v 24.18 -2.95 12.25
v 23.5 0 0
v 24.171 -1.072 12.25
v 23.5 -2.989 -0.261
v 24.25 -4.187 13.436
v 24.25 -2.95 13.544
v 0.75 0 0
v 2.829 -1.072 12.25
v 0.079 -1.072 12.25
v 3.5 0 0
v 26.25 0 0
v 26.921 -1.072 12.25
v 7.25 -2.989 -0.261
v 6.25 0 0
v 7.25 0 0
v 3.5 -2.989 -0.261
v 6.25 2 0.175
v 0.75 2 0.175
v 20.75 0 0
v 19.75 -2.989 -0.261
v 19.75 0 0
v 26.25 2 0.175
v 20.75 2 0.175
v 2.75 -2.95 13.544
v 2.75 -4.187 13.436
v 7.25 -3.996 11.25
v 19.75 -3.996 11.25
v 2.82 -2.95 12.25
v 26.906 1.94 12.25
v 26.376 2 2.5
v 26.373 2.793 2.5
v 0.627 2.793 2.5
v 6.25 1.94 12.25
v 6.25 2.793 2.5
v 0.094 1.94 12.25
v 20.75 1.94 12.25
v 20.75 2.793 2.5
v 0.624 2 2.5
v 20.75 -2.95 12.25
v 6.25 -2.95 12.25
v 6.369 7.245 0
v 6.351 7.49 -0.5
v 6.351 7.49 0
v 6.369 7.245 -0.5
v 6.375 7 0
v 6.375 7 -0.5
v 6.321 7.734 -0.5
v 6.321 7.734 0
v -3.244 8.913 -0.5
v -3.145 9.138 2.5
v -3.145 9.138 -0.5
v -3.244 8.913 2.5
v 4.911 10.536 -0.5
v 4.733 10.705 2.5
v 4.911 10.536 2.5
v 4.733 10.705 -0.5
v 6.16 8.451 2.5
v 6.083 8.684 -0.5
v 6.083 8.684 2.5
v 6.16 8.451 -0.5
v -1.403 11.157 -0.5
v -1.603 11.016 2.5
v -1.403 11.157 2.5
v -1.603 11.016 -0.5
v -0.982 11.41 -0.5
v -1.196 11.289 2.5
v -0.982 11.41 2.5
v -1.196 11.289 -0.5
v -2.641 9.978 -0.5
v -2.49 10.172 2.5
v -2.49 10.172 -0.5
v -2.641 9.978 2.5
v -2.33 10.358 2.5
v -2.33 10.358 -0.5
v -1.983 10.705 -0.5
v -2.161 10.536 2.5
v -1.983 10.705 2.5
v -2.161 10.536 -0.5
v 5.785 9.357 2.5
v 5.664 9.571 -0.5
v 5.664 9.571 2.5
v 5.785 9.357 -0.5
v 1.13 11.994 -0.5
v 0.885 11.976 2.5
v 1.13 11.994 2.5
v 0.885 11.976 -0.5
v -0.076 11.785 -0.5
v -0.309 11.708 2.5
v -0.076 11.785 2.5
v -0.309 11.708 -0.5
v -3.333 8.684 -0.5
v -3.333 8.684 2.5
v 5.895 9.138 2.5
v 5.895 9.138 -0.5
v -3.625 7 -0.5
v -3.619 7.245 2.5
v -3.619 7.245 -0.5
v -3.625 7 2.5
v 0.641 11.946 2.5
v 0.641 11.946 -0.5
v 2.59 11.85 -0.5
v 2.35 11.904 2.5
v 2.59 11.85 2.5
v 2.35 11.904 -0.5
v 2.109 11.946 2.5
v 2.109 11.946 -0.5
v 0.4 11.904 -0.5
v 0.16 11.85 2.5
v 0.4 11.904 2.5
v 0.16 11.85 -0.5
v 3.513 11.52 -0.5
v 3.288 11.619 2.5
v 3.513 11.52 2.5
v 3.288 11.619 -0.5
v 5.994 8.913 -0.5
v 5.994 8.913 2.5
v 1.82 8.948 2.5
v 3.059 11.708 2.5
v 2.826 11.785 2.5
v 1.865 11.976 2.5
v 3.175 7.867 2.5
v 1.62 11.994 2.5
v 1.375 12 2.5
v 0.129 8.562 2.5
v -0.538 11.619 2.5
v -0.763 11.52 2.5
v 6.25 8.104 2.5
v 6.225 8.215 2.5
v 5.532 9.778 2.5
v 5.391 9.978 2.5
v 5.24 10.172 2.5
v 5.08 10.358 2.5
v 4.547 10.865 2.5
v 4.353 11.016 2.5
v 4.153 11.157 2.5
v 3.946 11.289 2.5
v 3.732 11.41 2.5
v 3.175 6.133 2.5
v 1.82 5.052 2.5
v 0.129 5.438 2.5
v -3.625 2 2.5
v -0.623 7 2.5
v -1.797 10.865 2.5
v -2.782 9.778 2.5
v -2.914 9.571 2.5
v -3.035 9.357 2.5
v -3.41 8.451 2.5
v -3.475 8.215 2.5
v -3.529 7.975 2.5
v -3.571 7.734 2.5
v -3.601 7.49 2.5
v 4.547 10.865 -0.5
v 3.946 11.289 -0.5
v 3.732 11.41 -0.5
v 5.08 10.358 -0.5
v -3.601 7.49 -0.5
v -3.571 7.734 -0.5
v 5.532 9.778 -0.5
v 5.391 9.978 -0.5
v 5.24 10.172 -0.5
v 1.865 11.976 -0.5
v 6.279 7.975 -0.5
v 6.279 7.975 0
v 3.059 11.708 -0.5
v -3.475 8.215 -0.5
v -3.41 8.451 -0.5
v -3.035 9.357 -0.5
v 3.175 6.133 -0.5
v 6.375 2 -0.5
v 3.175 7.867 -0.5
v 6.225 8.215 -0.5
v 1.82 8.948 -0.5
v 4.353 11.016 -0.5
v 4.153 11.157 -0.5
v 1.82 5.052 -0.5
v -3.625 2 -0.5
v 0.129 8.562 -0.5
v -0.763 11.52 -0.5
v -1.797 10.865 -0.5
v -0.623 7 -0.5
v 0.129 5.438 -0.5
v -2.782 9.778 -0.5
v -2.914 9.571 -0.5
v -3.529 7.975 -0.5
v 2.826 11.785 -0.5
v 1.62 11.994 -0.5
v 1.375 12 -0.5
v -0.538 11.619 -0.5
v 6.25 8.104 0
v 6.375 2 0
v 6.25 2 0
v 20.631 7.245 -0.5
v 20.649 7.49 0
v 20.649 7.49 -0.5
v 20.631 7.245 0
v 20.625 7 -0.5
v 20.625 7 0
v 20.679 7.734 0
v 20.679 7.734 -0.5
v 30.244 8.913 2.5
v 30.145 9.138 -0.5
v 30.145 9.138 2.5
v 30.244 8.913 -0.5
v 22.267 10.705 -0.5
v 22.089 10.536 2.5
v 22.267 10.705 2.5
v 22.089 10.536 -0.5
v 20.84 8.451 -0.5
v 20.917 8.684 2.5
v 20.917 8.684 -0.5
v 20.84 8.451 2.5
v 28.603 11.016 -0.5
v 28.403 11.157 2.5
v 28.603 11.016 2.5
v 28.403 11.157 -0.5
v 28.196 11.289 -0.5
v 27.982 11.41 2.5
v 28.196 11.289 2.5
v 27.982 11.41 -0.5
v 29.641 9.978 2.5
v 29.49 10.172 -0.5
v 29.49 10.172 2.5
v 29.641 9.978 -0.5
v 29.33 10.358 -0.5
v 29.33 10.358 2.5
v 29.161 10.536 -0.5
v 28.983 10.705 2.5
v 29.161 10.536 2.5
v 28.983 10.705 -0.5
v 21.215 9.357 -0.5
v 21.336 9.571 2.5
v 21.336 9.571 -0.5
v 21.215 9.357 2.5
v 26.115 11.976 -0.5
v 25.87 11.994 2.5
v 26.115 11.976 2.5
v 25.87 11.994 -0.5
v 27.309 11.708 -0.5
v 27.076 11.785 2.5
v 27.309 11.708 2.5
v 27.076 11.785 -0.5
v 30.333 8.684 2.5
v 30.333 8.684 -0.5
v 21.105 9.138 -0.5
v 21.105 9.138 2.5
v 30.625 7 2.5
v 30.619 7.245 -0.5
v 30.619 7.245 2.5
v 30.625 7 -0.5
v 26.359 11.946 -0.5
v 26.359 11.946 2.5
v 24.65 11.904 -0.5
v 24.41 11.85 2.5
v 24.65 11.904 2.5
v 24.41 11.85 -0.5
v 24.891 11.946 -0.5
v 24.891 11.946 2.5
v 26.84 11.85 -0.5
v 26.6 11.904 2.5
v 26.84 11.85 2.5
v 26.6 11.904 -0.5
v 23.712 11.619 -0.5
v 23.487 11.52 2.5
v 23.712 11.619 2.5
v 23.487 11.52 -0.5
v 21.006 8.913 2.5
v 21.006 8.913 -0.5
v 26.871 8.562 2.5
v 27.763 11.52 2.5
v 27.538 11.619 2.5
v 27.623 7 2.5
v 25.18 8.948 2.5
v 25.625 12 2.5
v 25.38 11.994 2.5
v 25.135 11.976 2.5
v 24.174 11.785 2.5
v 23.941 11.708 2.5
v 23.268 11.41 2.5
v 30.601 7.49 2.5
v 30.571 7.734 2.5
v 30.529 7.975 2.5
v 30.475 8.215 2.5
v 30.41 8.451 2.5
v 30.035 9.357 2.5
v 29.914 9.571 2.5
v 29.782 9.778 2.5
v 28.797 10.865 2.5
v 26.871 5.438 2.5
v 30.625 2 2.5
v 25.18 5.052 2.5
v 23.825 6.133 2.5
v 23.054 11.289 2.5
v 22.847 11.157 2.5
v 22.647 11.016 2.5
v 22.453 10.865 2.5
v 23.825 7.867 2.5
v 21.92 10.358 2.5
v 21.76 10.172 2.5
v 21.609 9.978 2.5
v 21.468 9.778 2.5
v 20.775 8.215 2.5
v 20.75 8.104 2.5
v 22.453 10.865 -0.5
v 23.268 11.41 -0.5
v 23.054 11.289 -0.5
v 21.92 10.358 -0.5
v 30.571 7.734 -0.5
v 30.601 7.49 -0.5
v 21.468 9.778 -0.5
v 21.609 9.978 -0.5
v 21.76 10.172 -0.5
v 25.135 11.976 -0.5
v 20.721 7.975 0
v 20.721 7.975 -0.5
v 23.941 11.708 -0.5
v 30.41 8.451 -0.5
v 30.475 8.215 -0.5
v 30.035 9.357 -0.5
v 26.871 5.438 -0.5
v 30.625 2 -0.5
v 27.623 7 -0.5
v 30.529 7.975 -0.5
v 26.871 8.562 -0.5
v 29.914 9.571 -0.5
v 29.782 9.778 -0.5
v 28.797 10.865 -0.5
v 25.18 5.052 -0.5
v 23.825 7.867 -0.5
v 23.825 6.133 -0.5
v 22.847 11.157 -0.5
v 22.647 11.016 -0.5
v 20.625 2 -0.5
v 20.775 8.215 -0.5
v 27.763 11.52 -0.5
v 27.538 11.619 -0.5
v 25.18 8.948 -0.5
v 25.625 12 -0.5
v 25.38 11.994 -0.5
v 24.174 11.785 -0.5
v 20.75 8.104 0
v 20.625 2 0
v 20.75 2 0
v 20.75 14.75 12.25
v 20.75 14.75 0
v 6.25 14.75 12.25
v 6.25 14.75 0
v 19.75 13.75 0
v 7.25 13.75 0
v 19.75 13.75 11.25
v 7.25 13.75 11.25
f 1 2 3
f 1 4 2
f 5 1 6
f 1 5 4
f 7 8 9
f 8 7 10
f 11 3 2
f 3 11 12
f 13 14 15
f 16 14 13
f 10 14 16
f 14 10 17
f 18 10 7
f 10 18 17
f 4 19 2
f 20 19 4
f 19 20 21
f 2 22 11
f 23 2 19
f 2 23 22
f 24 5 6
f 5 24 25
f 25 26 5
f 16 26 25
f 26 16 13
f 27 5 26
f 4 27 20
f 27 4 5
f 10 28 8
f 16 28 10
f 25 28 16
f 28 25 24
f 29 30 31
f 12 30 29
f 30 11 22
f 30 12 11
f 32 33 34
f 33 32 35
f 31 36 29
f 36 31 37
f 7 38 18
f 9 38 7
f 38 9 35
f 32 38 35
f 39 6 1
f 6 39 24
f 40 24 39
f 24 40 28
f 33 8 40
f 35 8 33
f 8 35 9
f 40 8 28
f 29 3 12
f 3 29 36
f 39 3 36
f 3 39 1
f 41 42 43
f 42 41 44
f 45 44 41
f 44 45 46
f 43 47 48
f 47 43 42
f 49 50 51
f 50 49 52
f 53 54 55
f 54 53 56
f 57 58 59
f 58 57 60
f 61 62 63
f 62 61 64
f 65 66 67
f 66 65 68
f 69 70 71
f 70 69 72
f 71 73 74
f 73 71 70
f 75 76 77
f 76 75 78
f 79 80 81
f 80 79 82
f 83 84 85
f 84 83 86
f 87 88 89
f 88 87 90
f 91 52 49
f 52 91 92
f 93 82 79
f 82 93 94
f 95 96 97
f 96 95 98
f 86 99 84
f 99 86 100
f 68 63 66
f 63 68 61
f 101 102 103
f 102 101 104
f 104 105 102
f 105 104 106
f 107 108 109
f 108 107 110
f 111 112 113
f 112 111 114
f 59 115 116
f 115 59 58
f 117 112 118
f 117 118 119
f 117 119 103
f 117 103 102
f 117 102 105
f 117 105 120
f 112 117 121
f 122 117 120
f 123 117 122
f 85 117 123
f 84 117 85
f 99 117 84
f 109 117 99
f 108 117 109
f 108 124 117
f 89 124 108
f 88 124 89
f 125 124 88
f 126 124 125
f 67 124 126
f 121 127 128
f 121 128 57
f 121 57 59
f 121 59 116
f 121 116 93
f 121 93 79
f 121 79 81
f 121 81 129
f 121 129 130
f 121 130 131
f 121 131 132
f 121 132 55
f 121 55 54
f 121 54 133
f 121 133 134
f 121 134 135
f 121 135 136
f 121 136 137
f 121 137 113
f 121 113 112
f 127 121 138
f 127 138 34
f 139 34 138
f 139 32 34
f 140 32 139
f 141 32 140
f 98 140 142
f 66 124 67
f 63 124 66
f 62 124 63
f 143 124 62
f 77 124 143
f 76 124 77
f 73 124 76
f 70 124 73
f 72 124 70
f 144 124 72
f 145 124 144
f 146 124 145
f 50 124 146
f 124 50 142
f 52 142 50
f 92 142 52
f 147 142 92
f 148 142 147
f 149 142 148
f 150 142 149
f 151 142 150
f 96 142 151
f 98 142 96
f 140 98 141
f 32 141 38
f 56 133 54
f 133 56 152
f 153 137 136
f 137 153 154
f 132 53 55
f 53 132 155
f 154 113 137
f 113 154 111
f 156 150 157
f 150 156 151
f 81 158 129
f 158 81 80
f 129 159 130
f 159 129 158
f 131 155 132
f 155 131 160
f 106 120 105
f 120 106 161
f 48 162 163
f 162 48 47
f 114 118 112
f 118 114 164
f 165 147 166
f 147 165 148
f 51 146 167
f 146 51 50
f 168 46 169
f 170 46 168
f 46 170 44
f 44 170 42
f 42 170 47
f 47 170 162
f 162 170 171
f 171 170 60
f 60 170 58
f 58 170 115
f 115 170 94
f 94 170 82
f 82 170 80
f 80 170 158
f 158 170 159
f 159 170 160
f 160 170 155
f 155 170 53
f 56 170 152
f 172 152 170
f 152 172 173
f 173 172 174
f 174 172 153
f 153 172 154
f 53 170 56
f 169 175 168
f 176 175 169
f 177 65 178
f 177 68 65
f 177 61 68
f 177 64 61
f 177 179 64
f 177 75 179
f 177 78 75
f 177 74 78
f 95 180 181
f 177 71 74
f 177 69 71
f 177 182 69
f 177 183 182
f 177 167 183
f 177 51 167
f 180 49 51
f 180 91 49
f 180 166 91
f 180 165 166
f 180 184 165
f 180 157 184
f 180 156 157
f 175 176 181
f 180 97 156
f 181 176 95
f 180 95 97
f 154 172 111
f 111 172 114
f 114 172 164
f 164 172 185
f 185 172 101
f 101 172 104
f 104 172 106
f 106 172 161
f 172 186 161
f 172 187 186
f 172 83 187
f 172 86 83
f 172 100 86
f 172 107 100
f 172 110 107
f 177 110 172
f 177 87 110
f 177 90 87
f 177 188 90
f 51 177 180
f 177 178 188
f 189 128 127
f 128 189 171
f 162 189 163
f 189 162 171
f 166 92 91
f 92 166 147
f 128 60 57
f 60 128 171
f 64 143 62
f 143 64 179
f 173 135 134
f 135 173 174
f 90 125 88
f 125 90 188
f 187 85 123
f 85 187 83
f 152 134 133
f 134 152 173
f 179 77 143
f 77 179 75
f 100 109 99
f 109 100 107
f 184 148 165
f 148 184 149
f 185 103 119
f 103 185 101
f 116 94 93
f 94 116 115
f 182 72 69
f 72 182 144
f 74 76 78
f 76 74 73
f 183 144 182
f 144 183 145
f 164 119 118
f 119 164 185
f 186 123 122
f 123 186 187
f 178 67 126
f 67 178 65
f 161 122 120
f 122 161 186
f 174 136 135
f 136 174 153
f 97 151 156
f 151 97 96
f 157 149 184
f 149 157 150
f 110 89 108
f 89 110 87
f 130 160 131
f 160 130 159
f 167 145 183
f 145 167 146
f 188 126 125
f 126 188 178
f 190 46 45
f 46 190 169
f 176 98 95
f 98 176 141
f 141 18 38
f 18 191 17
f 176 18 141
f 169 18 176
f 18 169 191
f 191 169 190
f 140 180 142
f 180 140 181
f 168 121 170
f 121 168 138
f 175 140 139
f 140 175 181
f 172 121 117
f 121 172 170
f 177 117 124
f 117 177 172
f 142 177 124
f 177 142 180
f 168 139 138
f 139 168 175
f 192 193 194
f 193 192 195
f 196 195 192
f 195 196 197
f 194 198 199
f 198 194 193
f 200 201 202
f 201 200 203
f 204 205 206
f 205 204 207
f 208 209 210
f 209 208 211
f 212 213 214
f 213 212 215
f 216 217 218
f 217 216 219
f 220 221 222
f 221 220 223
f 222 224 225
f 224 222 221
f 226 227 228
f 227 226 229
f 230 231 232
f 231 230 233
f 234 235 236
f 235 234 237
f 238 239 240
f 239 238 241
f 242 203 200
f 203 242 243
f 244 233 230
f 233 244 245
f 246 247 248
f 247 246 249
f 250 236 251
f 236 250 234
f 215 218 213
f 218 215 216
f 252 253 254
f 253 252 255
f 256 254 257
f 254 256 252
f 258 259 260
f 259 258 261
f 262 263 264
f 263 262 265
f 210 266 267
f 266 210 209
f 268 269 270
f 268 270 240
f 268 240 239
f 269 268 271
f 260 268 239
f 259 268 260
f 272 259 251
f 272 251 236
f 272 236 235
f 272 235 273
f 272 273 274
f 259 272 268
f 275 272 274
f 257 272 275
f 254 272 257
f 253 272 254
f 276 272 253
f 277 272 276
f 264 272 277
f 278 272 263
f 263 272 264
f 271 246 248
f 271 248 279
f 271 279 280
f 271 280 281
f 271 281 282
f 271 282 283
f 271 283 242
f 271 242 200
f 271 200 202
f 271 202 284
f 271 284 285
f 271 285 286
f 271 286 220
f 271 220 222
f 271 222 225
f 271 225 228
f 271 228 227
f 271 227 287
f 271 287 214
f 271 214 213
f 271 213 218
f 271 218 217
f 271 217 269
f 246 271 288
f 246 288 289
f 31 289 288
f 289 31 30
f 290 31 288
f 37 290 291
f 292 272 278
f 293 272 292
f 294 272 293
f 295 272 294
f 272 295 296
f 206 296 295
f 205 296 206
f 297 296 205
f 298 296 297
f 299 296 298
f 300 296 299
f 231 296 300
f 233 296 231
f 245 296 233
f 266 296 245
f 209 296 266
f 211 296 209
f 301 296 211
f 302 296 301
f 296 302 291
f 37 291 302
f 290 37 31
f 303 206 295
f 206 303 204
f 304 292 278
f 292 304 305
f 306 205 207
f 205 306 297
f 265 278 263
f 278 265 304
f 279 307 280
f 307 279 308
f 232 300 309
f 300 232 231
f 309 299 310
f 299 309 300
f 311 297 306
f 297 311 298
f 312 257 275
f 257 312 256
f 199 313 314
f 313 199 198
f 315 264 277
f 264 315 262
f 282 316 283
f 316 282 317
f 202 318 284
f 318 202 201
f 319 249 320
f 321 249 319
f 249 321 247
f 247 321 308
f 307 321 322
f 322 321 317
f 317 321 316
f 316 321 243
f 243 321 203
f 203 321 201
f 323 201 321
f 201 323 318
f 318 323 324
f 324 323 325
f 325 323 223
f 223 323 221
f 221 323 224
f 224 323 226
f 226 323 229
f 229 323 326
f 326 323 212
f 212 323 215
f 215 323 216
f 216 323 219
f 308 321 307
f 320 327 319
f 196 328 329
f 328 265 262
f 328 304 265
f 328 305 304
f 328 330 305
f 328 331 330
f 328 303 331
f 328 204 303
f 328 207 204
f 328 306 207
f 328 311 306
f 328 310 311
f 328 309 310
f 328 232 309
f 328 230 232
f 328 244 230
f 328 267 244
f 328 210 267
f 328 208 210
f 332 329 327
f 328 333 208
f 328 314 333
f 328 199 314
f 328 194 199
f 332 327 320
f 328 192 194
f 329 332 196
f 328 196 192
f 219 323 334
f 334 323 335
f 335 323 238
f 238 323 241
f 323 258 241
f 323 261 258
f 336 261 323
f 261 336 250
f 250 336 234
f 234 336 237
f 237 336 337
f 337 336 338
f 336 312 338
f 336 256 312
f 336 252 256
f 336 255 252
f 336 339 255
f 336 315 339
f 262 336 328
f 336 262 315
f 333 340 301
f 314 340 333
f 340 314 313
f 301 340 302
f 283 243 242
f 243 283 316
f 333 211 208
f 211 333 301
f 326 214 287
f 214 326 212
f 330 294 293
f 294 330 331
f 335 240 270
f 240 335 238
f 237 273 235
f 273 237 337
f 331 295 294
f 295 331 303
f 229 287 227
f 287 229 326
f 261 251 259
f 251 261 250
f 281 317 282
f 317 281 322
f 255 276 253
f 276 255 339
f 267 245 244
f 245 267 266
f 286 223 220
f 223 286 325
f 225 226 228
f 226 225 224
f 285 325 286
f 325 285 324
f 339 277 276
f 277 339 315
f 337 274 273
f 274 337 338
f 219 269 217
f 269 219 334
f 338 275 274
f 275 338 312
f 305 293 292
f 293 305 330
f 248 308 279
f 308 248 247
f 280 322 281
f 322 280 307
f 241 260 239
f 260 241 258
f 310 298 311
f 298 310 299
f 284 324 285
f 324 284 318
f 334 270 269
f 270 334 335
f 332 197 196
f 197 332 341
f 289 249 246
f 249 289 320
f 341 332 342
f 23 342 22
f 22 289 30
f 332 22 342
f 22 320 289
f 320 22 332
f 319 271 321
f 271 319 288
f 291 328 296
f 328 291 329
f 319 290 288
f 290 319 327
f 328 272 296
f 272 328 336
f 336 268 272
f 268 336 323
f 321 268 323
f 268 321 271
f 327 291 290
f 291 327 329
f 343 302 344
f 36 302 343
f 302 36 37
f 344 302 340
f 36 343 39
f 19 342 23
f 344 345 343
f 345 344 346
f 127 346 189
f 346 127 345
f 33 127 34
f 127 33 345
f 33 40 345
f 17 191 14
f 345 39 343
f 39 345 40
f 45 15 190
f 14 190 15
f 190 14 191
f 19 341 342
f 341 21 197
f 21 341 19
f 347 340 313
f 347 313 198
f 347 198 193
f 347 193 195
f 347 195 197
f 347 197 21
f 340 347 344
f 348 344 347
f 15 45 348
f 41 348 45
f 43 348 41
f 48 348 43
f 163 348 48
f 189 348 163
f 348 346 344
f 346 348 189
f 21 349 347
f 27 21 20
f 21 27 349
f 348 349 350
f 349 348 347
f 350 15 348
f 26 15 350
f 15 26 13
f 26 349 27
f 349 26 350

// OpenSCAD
// file: retainer-clip-template.scad
COVER_X = 27;
COVER_X_VARIANCE = 1.5;
COVER_X_OFFSET = 2.75;
COVER_Y = 6;
COVER_Y_OFFSET = .05;
COVER_Z = 13.75;
COVER_Z_OFFSET = 1.5;
COVER_ANGLE = 5;

CLIP_R_OUTER = 5;
CLIP_R_INNER = 1.8;
CLIP_X_SEPARATION = 24.25;
CLIP_Y_OFFSET = 7;
CLIP_Z = 3;
CLIP_Z_OFFSET = .5;

CYLINDER_FACETS = 128;

module copy_mirror(v) { 
    children(); 
    mirror(v) children(); 
} 

module retainerClip() {
    rotate([COVER_ANGLE, 0, 0]) {
        difference() {
            union() {
                translate([COVER_X_OFFSET, 0, 0])
                    linear_extrude(height = COVER_Y / 2) 
                        polygon(points=[[COVER_X_VARIANCE / 2, 0], [COVER_X - (COVER_X_OFFSET * 2) - (COVER_X_VARIANCE / 2), 0], [COVER_X - (COVER_X_OFFSET * 2), COVER_Z], [0, COVER_Z]]);
                translate([0, 0, -COVER_Y / 2])
                    linear_extrude(height = COVER_Y / 2) 
                        polygon(points=[[COVER_X_VARIANCE / 2, 0], [COVER_X - (COVER_X_VARIANCE / 2), 0], [COVER_X, COVER_Z], [0, COVER_Z]]);
            }
            rotate([-COVER_ANGLE, 0, 0]) {
                translate([0, COVER_Z - COVER_Z_OFFSET, -COVER_Y / 2])
                    cube([COVER_X, COVER_Z_OFFSET * 2, COVER_Y - COVER_Y_OFFSET]);
            }
        }
    
        rotate([-90 - COVER_ANGLE, 0, 0]) {
        translate([COVER_X / 2, 0, 0])
            copy_mirror(vec=[0,1,0])
                translate([-CLIP_X_SEPARATION / 2, CLIP_Y_OFFSET, -CLIP_Z_OFFSET])
                    difference() {
                        union() {
                            cylinder(r=CLIP_R_OUTER, h=CLIP_Z, $fn=CYLINDER_FACETS);
                            translate([-CLIP_R_OUTER, -CLIP_R_OUTER, 0])
                                cube([CLIP_R_OUTER * 2, CLIP_R_OUTER, CLIP_Z]);
                        }
                        polyhole(h=CLIP_Z, d=CLIP_R_INNER * 2);
                    }
        }
    }
}
// main file
include <MCAD/polyholes.scad>;
include <retainer-clip-template.scad>;

USB_B_X = 12;
USB_B_Y = 16.5;
USB_B_Z = 11;
USB_B_TOLERANCE = .25;
USB_B_THICKNESS = 1;

LOGO = "../mf.png"; 
LOGO_X_OFFSET = 2.7;
LOGO_SCALE = .0375;

rotate([90, 0, 0]) {            
    difference() {   
        union() {
            translate([USB_B_Y + LOGO_X_OFFSET, USB_B_X + USB_B_THICKNESS, -USB_B_Z]) {
                rotate([90, 0, 180]) {
                    scale([LOGO_SCALE, LOGO_SCALE, .0075]) 
                        surface(file=LOGO, invert=true);
                }
            }
            retainerClip(); 
            translate([COVER_X / 2 - USB_B_X / 2 - USB_B_TOLERANCE - USB_B_THICKNESS, 0, COVER_Y / 2 - USB_B_Y - USB_B_TOLERANCE - USB_B_THICKNESS])
                cube([USB_B_X + USB_B_TOLERANCE * 2 + USB_B_THICKNESS * 2, USB_B_Z + USB_B_TOLERANCE + USB_B_THICKNESS, USB_B_Y + USB_B_TOLERANCE + USB_B_THICKNESS]);
        }
        translate([COVER_X / 2 - USB_B_X / 2 - USB_B_TOLERANCE, -USB_B_THICKNESS, COVER_Y / 2 - USB_B_Y - USB_B_TOLERANCE])
            cube([USB_B_X + USB_B_TOLERANCE * 2, USB_B_Z + USB_B_TOLERANCE + USB_B_THICKNESS, USB_B_Y + USB_B_TOLERANCE + USB_B_THICKNESS]);
        
    }
}
